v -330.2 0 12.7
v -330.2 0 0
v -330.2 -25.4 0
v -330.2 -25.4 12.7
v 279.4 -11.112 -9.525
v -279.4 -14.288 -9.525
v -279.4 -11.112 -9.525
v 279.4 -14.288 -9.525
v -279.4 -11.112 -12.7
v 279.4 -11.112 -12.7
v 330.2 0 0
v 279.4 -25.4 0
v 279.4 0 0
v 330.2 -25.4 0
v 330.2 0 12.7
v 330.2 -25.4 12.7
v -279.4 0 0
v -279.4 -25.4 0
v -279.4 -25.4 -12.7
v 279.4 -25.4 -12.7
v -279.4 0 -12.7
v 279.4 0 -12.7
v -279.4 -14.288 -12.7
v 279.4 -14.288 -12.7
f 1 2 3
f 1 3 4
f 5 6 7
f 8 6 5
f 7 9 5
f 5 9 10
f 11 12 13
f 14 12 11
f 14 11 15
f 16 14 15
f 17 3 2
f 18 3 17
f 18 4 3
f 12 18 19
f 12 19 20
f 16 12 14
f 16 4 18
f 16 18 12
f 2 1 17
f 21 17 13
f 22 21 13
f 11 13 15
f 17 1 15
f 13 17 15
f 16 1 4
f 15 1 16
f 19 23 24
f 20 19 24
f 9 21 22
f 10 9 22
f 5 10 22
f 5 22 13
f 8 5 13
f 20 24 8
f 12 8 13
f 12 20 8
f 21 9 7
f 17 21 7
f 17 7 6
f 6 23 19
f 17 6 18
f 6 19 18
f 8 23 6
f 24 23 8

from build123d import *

# Parameters (mm, degrees)
F0_W     = 660.4
F0_H     = 25.4
F1_DEPTH = 25.4
F2_W     = 50.8
F2_H     = 12.7
F3_DEPTH = 25.4
F4_W     = 558.8
F4_H     = 3.175
F5_DEPTH = 3.175


with BuildPart() as f1:
    # F0 (on Front) → F1 (new body)
    with BuildSketch(Plane.XZ):
        Rectangle(F0_W, F0_H)
    extrude(amount=F1_DEPTH)

    # F2 (on face) → F3 (cut)
    with BuildSketch(Plane.XZ.offset(25.4)):
        with Locations((-304.8, -6.35)):
            Rectangle(F2_W, F2_H)
        with Locations((304.8, -6.35)):
            Rectangle(F2_W, F2_H)
    extrude(amount=-F3_DEPTH, mode=Mode.SUBTRACT)

    # F4 (on face) → F5 (cut)
    with BuildSketch(Plane(origin=(0, 0, -12.7), x_dir=(1, 0, 0), z_dir=(0, 0, -1))):
        with Locations((0, 12.7)):
            Rectangle(F4_W, F4_H)
    extrude(amount=-F5_DEPTH, mode=Mode.SUBTRACT)


solid = f1.part
